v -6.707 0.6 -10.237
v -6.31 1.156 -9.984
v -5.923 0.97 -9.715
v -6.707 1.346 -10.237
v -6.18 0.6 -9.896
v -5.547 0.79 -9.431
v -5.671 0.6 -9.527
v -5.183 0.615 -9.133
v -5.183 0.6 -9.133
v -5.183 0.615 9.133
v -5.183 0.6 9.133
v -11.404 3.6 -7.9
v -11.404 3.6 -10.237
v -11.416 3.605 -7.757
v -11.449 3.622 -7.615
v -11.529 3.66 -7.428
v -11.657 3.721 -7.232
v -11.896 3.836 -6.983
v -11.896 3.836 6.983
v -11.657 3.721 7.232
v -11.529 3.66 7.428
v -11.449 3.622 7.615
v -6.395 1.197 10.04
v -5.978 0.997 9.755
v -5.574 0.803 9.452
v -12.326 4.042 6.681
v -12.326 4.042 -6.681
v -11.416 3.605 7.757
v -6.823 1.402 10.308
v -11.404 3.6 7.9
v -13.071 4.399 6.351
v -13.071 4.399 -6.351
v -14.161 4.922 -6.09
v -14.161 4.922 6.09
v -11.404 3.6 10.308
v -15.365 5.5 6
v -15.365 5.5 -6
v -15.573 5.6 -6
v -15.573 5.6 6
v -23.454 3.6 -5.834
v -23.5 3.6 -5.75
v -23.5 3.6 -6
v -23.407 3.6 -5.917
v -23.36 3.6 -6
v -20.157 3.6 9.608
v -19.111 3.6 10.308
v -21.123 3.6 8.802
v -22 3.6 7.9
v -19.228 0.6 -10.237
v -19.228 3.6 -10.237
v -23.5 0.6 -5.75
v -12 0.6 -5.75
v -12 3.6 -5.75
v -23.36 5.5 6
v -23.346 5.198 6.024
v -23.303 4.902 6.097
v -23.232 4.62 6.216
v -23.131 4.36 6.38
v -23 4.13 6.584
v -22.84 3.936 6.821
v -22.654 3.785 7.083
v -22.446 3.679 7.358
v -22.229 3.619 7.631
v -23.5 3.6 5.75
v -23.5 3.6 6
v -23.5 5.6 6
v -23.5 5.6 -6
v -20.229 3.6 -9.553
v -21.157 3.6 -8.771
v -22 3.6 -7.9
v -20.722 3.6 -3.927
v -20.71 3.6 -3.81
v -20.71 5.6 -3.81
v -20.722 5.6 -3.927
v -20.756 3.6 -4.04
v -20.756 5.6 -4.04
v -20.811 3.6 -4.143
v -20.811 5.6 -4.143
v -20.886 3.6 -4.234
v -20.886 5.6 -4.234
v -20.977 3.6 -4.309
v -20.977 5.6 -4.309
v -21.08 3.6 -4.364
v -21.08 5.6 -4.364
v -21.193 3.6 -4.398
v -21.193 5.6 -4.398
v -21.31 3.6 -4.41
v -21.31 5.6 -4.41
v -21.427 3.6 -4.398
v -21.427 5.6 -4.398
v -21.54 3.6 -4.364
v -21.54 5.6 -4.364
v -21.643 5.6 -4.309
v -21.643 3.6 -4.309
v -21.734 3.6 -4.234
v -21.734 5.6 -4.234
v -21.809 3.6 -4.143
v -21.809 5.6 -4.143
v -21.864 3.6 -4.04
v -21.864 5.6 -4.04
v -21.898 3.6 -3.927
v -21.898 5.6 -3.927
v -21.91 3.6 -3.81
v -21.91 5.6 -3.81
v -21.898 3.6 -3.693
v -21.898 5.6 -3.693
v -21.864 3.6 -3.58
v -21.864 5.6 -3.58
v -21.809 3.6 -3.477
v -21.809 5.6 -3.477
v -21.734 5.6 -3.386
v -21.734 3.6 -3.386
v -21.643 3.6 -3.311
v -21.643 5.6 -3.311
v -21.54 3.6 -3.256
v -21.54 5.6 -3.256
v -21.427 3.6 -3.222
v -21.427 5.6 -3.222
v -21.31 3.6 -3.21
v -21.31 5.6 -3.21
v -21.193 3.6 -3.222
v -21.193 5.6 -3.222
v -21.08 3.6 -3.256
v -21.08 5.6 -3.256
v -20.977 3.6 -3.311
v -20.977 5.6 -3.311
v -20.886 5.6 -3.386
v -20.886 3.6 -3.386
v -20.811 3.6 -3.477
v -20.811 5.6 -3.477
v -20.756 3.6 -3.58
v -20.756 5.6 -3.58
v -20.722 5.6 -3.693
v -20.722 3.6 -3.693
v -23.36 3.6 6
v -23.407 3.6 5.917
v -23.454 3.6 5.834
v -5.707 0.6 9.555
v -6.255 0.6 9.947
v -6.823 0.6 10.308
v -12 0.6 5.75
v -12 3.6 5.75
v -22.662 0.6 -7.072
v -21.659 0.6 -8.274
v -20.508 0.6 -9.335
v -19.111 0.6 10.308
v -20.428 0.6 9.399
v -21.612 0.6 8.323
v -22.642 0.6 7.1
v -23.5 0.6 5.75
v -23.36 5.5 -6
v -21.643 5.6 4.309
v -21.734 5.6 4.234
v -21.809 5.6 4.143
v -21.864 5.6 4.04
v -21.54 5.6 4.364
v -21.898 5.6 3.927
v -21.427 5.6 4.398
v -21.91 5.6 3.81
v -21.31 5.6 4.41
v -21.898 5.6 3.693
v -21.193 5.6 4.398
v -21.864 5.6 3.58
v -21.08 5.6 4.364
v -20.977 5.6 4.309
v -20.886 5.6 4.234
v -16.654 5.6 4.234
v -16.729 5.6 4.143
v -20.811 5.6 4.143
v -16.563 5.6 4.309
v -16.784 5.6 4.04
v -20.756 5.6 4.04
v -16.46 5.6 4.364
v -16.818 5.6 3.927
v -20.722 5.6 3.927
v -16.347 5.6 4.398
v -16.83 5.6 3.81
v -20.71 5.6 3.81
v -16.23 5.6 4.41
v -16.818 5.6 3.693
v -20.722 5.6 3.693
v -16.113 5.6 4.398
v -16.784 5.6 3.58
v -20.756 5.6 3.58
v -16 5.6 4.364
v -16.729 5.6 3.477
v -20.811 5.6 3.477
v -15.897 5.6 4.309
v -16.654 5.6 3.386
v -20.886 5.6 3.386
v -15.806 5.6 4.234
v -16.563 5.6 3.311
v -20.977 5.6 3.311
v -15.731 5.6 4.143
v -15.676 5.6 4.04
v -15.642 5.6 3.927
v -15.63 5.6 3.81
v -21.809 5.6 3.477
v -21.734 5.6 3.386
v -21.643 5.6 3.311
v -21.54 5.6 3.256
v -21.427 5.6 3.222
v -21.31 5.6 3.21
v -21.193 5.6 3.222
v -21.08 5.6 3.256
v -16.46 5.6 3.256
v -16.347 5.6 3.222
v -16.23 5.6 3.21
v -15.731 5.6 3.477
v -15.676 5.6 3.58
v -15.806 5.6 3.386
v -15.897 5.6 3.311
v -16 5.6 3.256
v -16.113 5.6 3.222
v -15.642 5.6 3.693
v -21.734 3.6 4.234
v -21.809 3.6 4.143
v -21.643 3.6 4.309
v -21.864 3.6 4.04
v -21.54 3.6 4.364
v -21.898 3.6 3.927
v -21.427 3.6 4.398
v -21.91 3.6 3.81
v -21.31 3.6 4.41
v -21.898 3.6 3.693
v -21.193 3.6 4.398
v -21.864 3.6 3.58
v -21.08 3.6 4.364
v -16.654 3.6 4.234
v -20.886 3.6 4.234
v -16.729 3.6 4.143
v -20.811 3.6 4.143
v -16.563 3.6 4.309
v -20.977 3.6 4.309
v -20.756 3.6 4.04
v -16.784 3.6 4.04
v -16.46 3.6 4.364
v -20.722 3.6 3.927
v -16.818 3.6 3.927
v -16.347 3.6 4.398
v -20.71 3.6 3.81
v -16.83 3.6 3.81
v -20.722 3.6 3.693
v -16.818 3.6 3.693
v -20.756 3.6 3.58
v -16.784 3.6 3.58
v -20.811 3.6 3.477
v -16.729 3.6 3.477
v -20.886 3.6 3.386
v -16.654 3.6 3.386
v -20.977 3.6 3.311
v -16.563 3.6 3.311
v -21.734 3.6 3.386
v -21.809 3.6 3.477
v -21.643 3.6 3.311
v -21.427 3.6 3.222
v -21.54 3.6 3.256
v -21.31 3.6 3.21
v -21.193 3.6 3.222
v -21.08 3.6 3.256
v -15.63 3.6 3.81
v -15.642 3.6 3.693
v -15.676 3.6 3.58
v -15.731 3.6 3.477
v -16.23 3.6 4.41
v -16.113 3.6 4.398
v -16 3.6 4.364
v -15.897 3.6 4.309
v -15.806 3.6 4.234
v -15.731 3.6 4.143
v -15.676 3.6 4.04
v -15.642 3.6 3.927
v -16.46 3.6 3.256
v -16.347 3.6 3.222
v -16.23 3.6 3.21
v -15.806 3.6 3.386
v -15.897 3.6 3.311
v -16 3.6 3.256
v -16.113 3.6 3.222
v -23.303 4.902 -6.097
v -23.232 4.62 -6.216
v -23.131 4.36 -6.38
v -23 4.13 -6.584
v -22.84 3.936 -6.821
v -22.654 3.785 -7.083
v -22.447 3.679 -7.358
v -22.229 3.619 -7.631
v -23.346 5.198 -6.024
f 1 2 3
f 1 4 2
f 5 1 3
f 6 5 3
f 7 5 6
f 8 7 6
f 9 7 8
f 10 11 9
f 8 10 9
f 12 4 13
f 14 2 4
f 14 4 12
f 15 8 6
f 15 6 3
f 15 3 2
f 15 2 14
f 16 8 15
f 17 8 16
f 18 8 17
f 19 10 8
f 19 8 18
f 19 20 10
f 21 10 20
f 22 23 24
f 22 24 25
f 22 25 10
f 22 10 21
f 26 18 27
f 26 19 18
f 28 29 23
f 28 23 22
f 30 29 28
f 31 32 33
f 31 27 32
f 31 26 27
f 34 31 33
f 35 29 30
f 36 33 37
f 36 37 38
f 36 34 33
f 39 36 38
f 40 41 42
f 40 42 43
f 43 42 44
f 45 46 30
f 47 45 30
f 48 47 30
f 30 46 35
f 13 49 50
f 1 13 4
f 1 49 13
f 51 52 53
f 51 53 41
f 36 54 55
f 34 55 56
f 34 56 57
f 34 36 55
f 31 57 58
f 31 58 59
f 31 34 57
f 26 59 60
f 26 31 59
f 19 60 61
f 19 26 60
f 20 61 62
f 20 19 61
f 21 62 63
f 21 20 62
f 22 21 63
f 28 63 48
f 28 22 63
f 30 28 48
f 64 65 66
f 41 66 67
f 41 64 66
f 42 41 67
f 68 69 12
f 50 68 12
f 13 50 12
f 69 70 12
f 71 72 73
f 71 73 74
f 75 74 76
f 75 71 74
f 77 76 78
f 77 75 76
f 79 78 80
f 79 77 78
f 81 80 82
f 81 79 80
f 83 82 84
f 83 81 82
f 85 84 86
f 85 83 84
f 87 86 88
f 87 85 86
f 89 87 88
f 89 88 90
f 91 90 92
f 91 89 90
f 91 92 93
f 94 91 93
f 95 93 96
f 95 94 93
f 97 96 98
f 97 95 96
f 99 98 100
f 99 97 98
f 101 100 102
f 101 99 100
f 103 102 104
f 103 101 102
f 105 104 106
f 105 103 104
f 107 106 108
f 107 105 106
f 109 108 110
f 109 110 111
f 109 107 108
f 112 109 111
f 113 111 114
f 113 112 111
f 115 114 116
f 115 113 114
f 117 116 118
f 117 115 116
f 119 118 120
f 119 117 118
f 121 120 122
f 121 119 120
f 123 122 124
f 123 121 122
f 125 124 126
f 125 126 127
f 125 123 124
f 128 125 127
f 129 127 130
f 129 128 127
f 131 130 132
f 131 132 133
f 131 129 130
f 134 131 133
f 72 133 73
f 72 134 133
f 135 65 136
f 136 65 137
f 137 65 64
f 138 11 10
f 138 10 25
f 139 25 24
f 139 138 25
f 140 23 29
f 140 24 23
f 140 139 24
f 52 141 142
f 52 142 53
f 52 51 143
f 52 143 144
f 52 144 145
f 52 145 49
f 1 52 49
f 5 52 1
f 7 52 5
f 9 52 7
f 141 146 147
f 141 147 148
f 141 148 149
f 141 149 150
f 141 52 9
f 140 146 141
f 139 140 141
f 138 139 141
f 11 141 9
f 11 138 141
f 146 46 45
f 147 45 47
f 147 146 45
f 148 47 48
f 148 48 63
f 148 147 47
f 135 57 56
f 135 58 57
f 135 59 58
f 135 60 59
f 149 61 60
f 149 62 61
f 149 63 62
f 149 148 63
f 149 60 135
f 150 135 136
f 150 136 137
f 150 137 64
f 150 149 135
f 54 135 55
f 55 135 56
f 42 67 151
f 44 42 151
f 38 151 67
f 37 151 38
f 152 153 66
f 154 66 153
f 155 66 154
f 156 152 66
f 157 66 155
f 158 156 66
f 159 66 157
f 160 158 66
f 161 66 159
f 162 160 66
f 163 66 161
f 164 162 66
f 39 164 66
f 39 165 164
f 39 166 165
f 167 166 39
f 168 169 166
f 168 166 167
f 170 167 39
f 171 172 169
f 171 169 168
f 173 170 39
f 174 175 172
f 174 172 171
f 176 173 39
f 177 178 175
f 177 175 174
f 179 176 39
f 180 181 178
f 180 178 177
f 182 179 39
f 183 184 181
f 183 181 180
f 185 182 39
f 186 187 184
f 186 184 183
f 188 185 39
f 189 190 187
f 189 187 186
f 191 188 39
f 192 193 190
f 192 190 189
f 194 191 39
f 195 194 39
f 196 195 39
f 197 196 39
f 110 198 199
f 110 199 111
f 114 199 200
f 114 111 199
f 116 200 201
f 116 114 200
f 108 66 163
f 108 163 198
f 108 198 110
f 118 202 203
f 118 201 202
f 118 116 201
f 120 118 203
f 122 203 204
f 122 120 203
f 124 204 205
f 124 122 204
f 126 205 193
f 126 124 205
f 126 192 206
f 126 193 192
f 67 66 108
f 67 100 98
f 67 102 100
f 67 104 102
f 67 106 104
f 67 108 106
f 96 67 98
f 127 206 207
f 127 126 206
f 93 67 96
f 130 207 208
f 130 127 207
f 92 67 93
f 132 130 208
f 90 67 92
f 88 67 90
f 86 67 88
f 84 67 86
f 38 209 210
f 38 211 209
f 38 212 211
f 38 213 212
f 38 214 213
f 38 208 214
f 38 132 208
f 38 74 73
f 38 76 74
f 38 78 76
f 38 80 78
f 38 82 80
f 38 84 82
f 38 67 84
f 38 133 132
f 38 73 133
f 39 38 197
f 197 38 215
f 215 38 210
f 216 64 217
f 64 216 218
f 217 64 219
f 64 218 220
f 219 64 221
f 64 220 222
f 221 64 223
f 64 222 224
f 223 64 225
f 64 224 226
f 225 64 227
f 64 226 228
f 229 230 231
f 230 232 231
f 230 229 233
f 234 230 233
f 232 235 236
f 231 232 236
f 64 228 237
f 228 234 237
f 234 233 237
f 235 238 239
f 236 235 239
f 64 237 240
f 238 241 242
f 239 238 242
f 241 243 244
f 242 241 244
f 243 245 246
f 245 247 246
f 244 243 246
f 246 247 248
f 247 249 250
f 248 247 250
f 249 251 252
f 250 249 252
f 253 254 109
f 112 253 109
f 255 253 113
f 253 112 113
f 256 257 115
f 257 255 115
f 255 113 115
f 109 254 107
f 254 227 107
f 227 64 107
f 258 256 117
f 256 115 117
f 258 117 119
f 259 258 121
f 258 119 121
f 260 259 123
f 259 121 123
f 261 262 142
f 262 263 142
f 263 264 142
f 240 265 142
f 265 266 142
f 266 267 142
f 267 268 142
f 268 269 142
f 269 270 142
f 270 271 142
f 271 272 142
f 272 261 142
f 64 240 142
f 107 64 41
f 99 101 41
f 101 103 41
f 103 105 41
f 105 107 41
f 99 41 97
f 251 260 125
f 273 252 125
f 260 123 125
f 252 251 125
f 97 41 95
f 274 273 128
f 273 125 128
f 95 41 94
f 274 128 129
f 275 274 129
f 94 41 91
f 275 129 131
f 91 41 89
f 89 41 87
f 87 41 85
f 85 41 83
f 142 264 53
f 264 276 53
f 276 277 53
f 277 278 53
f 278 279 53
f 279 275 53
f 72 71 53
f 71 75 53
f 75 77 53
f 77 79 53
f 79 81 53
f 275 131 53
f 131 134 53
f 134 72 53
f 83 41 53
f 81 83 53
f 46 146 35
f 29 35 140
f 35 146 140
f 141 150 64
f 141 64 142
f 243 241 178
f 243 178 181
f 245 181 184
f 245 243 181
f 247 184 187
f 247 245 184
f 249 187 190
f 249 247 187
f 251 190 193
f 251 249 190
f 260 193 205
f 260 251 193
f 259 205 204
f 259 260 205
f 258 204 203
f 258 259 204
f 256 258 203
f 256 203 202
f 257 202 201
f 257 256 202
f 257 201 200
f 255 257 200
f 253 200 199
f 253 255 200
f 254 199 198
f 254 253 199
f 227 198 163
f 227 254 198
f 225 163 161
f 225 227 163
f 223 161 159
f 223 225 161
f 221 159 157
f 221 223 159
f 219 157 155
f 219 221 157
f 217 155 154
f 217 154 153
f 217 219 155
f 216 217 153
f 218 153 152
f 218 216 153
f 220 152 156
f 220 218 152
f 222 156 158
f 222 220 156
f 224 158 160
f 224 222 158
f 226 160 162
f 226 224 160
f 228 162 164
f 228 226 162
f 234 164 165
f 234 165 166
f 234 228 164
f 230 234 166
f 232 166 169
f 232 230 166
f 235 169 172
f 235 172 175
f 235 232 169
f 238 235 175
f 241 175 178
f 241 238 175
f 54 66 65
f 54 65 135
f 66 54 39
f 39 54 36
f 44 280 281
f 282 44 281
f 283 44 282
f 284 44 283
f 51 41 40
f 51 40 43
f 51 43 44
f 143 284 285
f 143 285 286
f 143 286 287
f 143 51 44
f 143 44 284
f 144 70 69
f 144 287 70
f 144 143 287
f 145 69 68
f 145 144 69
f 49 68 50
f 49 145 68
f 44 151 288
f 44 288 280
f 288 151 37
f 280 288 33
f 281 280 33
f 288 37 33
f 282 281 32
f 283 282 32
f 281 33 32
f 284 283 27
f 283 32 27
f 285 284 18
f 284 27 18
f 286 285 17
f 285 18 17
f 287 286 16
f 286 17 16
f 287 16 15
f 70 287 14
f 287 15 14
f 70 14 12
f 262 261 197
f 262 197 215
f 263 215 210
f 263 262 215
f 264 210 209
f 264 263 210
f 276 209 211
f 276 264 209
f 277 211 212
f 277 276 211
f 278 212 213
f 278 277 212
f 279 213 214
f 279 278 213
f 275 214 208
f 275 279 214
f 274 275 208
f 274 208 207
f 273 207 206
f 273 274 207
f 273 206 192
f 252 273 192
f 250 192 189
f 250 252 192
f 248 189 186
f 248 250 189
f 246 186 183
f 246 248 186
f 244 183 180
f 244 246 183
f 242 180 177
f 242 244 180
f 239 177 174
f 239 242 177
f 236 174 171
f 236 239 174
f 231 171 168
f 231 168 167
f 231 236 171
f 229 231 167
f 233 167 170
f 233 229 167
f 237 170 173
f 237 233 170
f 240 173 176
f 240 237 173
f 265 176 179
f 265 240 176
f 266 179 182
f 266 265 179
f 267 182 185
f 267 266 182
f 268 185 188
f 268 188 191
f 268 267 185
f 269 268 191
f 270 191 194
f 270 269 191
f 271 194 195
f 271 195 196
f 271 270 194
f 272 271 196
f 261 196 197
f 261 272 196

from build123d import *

# Parameters (mm, degrees)
PAD009_DEPTH    = 3
SKETCH023_W     = 15
SKETCH023_H     = 12
SKETCH023_R     = 0.6
PAD010_DEPTH    = 2
POCKET009_DEPTH = 20.546094
FILLET002_R     = 1.9


with BuildPart() as part:
    # Sketch024 → Pad009 (new body)
    with BuildSketch(Plane.XZ):
        with BuildLine():
            Line((-23.5, 5.75), (-12, 5.75))
            Line((-12, 5.75), (-12, -5.75))
            Line((-12, -5.75), (-23.5, -5.75))
            ThreePointArc((-23.5, -5.75), (-21.658628, -8.274119), (-19.228067, -10.237331))
            Line((-19.228067, -10.237331), (-6.706558, -10.237331))
            ThreePointArc((-6.706558, -10.237331), (-5.923041, -9.714846), (-5.182908, -9.132527))
            Line((-5.182908, 9.132527), (-5.182908, -9.132527))
            ThreePointArc((-5.182908, 9.132527), (-5.978311, 9.754684), (-6.823207, 10.307762))
            Line((-19.111419, 10.307762), (-6.823207, 10.307762))
            ThreePointArc((-19.111419, 10.307762), (-21.611511, 8.323331), (-23.5, 5.75))
        make_face()
    extrude(amount=-PAD009_DEPTH)

    # Sketch023 (on Face12 of Pad009) → Pad010 (join)
    with BuildSketch(Plane(origin=(0, 3, 0), x_dir=(1, 0, 0), z_dir=(0, 1, 0))):
        with Locations((-16, 0)):
            Rectangle(SKETCH023_W, SKETCH023_H)
        with Locations((-21.31, -3.81)):
            Circle(SKETCH023_R, mode=Mode.SUBTRACT)
        with Locations((-21.31, 3.81)):
            Circle(SKETCH023_R, mode=Mode.SUBTRACT)
        with Locations((-16.23, -3.81)):
            Circle(SKETCH023_R, mode=Mode.SUBTRACT)
    extrude(amount=PAD010_DEPTH)

    # Sketch026 (on Face2 of Pad010) → Pocket009 (cut, through all)
    with BuildSketch(Plane(origin=(0, 0, 10.307762), x_dir=(-1, 0, 0), z_dir=(0, 0, 1))):
        Polygon((5.151306, 0), (15.6, -5.012868), (5.151306, -5.012868), align=None)
    extrude(amount=-POCKET009_DEPTH, mode=Mode.SUBTRACT)

    # Fillet002
    fillet002_edges = [part.edges().sort_by_distance(p)[0] for p in [
        (-17.382023, 3, 6),
        (-17.382023, 3, -6),
    ]]
    fillet(fillet002_edges, radius=FILLET002_R)


with BuildPart() as part_1:
    # Body003 placement: moved
    add(part.part.moved(Location((0, 0.6, 0))))


solid = part_1.part
